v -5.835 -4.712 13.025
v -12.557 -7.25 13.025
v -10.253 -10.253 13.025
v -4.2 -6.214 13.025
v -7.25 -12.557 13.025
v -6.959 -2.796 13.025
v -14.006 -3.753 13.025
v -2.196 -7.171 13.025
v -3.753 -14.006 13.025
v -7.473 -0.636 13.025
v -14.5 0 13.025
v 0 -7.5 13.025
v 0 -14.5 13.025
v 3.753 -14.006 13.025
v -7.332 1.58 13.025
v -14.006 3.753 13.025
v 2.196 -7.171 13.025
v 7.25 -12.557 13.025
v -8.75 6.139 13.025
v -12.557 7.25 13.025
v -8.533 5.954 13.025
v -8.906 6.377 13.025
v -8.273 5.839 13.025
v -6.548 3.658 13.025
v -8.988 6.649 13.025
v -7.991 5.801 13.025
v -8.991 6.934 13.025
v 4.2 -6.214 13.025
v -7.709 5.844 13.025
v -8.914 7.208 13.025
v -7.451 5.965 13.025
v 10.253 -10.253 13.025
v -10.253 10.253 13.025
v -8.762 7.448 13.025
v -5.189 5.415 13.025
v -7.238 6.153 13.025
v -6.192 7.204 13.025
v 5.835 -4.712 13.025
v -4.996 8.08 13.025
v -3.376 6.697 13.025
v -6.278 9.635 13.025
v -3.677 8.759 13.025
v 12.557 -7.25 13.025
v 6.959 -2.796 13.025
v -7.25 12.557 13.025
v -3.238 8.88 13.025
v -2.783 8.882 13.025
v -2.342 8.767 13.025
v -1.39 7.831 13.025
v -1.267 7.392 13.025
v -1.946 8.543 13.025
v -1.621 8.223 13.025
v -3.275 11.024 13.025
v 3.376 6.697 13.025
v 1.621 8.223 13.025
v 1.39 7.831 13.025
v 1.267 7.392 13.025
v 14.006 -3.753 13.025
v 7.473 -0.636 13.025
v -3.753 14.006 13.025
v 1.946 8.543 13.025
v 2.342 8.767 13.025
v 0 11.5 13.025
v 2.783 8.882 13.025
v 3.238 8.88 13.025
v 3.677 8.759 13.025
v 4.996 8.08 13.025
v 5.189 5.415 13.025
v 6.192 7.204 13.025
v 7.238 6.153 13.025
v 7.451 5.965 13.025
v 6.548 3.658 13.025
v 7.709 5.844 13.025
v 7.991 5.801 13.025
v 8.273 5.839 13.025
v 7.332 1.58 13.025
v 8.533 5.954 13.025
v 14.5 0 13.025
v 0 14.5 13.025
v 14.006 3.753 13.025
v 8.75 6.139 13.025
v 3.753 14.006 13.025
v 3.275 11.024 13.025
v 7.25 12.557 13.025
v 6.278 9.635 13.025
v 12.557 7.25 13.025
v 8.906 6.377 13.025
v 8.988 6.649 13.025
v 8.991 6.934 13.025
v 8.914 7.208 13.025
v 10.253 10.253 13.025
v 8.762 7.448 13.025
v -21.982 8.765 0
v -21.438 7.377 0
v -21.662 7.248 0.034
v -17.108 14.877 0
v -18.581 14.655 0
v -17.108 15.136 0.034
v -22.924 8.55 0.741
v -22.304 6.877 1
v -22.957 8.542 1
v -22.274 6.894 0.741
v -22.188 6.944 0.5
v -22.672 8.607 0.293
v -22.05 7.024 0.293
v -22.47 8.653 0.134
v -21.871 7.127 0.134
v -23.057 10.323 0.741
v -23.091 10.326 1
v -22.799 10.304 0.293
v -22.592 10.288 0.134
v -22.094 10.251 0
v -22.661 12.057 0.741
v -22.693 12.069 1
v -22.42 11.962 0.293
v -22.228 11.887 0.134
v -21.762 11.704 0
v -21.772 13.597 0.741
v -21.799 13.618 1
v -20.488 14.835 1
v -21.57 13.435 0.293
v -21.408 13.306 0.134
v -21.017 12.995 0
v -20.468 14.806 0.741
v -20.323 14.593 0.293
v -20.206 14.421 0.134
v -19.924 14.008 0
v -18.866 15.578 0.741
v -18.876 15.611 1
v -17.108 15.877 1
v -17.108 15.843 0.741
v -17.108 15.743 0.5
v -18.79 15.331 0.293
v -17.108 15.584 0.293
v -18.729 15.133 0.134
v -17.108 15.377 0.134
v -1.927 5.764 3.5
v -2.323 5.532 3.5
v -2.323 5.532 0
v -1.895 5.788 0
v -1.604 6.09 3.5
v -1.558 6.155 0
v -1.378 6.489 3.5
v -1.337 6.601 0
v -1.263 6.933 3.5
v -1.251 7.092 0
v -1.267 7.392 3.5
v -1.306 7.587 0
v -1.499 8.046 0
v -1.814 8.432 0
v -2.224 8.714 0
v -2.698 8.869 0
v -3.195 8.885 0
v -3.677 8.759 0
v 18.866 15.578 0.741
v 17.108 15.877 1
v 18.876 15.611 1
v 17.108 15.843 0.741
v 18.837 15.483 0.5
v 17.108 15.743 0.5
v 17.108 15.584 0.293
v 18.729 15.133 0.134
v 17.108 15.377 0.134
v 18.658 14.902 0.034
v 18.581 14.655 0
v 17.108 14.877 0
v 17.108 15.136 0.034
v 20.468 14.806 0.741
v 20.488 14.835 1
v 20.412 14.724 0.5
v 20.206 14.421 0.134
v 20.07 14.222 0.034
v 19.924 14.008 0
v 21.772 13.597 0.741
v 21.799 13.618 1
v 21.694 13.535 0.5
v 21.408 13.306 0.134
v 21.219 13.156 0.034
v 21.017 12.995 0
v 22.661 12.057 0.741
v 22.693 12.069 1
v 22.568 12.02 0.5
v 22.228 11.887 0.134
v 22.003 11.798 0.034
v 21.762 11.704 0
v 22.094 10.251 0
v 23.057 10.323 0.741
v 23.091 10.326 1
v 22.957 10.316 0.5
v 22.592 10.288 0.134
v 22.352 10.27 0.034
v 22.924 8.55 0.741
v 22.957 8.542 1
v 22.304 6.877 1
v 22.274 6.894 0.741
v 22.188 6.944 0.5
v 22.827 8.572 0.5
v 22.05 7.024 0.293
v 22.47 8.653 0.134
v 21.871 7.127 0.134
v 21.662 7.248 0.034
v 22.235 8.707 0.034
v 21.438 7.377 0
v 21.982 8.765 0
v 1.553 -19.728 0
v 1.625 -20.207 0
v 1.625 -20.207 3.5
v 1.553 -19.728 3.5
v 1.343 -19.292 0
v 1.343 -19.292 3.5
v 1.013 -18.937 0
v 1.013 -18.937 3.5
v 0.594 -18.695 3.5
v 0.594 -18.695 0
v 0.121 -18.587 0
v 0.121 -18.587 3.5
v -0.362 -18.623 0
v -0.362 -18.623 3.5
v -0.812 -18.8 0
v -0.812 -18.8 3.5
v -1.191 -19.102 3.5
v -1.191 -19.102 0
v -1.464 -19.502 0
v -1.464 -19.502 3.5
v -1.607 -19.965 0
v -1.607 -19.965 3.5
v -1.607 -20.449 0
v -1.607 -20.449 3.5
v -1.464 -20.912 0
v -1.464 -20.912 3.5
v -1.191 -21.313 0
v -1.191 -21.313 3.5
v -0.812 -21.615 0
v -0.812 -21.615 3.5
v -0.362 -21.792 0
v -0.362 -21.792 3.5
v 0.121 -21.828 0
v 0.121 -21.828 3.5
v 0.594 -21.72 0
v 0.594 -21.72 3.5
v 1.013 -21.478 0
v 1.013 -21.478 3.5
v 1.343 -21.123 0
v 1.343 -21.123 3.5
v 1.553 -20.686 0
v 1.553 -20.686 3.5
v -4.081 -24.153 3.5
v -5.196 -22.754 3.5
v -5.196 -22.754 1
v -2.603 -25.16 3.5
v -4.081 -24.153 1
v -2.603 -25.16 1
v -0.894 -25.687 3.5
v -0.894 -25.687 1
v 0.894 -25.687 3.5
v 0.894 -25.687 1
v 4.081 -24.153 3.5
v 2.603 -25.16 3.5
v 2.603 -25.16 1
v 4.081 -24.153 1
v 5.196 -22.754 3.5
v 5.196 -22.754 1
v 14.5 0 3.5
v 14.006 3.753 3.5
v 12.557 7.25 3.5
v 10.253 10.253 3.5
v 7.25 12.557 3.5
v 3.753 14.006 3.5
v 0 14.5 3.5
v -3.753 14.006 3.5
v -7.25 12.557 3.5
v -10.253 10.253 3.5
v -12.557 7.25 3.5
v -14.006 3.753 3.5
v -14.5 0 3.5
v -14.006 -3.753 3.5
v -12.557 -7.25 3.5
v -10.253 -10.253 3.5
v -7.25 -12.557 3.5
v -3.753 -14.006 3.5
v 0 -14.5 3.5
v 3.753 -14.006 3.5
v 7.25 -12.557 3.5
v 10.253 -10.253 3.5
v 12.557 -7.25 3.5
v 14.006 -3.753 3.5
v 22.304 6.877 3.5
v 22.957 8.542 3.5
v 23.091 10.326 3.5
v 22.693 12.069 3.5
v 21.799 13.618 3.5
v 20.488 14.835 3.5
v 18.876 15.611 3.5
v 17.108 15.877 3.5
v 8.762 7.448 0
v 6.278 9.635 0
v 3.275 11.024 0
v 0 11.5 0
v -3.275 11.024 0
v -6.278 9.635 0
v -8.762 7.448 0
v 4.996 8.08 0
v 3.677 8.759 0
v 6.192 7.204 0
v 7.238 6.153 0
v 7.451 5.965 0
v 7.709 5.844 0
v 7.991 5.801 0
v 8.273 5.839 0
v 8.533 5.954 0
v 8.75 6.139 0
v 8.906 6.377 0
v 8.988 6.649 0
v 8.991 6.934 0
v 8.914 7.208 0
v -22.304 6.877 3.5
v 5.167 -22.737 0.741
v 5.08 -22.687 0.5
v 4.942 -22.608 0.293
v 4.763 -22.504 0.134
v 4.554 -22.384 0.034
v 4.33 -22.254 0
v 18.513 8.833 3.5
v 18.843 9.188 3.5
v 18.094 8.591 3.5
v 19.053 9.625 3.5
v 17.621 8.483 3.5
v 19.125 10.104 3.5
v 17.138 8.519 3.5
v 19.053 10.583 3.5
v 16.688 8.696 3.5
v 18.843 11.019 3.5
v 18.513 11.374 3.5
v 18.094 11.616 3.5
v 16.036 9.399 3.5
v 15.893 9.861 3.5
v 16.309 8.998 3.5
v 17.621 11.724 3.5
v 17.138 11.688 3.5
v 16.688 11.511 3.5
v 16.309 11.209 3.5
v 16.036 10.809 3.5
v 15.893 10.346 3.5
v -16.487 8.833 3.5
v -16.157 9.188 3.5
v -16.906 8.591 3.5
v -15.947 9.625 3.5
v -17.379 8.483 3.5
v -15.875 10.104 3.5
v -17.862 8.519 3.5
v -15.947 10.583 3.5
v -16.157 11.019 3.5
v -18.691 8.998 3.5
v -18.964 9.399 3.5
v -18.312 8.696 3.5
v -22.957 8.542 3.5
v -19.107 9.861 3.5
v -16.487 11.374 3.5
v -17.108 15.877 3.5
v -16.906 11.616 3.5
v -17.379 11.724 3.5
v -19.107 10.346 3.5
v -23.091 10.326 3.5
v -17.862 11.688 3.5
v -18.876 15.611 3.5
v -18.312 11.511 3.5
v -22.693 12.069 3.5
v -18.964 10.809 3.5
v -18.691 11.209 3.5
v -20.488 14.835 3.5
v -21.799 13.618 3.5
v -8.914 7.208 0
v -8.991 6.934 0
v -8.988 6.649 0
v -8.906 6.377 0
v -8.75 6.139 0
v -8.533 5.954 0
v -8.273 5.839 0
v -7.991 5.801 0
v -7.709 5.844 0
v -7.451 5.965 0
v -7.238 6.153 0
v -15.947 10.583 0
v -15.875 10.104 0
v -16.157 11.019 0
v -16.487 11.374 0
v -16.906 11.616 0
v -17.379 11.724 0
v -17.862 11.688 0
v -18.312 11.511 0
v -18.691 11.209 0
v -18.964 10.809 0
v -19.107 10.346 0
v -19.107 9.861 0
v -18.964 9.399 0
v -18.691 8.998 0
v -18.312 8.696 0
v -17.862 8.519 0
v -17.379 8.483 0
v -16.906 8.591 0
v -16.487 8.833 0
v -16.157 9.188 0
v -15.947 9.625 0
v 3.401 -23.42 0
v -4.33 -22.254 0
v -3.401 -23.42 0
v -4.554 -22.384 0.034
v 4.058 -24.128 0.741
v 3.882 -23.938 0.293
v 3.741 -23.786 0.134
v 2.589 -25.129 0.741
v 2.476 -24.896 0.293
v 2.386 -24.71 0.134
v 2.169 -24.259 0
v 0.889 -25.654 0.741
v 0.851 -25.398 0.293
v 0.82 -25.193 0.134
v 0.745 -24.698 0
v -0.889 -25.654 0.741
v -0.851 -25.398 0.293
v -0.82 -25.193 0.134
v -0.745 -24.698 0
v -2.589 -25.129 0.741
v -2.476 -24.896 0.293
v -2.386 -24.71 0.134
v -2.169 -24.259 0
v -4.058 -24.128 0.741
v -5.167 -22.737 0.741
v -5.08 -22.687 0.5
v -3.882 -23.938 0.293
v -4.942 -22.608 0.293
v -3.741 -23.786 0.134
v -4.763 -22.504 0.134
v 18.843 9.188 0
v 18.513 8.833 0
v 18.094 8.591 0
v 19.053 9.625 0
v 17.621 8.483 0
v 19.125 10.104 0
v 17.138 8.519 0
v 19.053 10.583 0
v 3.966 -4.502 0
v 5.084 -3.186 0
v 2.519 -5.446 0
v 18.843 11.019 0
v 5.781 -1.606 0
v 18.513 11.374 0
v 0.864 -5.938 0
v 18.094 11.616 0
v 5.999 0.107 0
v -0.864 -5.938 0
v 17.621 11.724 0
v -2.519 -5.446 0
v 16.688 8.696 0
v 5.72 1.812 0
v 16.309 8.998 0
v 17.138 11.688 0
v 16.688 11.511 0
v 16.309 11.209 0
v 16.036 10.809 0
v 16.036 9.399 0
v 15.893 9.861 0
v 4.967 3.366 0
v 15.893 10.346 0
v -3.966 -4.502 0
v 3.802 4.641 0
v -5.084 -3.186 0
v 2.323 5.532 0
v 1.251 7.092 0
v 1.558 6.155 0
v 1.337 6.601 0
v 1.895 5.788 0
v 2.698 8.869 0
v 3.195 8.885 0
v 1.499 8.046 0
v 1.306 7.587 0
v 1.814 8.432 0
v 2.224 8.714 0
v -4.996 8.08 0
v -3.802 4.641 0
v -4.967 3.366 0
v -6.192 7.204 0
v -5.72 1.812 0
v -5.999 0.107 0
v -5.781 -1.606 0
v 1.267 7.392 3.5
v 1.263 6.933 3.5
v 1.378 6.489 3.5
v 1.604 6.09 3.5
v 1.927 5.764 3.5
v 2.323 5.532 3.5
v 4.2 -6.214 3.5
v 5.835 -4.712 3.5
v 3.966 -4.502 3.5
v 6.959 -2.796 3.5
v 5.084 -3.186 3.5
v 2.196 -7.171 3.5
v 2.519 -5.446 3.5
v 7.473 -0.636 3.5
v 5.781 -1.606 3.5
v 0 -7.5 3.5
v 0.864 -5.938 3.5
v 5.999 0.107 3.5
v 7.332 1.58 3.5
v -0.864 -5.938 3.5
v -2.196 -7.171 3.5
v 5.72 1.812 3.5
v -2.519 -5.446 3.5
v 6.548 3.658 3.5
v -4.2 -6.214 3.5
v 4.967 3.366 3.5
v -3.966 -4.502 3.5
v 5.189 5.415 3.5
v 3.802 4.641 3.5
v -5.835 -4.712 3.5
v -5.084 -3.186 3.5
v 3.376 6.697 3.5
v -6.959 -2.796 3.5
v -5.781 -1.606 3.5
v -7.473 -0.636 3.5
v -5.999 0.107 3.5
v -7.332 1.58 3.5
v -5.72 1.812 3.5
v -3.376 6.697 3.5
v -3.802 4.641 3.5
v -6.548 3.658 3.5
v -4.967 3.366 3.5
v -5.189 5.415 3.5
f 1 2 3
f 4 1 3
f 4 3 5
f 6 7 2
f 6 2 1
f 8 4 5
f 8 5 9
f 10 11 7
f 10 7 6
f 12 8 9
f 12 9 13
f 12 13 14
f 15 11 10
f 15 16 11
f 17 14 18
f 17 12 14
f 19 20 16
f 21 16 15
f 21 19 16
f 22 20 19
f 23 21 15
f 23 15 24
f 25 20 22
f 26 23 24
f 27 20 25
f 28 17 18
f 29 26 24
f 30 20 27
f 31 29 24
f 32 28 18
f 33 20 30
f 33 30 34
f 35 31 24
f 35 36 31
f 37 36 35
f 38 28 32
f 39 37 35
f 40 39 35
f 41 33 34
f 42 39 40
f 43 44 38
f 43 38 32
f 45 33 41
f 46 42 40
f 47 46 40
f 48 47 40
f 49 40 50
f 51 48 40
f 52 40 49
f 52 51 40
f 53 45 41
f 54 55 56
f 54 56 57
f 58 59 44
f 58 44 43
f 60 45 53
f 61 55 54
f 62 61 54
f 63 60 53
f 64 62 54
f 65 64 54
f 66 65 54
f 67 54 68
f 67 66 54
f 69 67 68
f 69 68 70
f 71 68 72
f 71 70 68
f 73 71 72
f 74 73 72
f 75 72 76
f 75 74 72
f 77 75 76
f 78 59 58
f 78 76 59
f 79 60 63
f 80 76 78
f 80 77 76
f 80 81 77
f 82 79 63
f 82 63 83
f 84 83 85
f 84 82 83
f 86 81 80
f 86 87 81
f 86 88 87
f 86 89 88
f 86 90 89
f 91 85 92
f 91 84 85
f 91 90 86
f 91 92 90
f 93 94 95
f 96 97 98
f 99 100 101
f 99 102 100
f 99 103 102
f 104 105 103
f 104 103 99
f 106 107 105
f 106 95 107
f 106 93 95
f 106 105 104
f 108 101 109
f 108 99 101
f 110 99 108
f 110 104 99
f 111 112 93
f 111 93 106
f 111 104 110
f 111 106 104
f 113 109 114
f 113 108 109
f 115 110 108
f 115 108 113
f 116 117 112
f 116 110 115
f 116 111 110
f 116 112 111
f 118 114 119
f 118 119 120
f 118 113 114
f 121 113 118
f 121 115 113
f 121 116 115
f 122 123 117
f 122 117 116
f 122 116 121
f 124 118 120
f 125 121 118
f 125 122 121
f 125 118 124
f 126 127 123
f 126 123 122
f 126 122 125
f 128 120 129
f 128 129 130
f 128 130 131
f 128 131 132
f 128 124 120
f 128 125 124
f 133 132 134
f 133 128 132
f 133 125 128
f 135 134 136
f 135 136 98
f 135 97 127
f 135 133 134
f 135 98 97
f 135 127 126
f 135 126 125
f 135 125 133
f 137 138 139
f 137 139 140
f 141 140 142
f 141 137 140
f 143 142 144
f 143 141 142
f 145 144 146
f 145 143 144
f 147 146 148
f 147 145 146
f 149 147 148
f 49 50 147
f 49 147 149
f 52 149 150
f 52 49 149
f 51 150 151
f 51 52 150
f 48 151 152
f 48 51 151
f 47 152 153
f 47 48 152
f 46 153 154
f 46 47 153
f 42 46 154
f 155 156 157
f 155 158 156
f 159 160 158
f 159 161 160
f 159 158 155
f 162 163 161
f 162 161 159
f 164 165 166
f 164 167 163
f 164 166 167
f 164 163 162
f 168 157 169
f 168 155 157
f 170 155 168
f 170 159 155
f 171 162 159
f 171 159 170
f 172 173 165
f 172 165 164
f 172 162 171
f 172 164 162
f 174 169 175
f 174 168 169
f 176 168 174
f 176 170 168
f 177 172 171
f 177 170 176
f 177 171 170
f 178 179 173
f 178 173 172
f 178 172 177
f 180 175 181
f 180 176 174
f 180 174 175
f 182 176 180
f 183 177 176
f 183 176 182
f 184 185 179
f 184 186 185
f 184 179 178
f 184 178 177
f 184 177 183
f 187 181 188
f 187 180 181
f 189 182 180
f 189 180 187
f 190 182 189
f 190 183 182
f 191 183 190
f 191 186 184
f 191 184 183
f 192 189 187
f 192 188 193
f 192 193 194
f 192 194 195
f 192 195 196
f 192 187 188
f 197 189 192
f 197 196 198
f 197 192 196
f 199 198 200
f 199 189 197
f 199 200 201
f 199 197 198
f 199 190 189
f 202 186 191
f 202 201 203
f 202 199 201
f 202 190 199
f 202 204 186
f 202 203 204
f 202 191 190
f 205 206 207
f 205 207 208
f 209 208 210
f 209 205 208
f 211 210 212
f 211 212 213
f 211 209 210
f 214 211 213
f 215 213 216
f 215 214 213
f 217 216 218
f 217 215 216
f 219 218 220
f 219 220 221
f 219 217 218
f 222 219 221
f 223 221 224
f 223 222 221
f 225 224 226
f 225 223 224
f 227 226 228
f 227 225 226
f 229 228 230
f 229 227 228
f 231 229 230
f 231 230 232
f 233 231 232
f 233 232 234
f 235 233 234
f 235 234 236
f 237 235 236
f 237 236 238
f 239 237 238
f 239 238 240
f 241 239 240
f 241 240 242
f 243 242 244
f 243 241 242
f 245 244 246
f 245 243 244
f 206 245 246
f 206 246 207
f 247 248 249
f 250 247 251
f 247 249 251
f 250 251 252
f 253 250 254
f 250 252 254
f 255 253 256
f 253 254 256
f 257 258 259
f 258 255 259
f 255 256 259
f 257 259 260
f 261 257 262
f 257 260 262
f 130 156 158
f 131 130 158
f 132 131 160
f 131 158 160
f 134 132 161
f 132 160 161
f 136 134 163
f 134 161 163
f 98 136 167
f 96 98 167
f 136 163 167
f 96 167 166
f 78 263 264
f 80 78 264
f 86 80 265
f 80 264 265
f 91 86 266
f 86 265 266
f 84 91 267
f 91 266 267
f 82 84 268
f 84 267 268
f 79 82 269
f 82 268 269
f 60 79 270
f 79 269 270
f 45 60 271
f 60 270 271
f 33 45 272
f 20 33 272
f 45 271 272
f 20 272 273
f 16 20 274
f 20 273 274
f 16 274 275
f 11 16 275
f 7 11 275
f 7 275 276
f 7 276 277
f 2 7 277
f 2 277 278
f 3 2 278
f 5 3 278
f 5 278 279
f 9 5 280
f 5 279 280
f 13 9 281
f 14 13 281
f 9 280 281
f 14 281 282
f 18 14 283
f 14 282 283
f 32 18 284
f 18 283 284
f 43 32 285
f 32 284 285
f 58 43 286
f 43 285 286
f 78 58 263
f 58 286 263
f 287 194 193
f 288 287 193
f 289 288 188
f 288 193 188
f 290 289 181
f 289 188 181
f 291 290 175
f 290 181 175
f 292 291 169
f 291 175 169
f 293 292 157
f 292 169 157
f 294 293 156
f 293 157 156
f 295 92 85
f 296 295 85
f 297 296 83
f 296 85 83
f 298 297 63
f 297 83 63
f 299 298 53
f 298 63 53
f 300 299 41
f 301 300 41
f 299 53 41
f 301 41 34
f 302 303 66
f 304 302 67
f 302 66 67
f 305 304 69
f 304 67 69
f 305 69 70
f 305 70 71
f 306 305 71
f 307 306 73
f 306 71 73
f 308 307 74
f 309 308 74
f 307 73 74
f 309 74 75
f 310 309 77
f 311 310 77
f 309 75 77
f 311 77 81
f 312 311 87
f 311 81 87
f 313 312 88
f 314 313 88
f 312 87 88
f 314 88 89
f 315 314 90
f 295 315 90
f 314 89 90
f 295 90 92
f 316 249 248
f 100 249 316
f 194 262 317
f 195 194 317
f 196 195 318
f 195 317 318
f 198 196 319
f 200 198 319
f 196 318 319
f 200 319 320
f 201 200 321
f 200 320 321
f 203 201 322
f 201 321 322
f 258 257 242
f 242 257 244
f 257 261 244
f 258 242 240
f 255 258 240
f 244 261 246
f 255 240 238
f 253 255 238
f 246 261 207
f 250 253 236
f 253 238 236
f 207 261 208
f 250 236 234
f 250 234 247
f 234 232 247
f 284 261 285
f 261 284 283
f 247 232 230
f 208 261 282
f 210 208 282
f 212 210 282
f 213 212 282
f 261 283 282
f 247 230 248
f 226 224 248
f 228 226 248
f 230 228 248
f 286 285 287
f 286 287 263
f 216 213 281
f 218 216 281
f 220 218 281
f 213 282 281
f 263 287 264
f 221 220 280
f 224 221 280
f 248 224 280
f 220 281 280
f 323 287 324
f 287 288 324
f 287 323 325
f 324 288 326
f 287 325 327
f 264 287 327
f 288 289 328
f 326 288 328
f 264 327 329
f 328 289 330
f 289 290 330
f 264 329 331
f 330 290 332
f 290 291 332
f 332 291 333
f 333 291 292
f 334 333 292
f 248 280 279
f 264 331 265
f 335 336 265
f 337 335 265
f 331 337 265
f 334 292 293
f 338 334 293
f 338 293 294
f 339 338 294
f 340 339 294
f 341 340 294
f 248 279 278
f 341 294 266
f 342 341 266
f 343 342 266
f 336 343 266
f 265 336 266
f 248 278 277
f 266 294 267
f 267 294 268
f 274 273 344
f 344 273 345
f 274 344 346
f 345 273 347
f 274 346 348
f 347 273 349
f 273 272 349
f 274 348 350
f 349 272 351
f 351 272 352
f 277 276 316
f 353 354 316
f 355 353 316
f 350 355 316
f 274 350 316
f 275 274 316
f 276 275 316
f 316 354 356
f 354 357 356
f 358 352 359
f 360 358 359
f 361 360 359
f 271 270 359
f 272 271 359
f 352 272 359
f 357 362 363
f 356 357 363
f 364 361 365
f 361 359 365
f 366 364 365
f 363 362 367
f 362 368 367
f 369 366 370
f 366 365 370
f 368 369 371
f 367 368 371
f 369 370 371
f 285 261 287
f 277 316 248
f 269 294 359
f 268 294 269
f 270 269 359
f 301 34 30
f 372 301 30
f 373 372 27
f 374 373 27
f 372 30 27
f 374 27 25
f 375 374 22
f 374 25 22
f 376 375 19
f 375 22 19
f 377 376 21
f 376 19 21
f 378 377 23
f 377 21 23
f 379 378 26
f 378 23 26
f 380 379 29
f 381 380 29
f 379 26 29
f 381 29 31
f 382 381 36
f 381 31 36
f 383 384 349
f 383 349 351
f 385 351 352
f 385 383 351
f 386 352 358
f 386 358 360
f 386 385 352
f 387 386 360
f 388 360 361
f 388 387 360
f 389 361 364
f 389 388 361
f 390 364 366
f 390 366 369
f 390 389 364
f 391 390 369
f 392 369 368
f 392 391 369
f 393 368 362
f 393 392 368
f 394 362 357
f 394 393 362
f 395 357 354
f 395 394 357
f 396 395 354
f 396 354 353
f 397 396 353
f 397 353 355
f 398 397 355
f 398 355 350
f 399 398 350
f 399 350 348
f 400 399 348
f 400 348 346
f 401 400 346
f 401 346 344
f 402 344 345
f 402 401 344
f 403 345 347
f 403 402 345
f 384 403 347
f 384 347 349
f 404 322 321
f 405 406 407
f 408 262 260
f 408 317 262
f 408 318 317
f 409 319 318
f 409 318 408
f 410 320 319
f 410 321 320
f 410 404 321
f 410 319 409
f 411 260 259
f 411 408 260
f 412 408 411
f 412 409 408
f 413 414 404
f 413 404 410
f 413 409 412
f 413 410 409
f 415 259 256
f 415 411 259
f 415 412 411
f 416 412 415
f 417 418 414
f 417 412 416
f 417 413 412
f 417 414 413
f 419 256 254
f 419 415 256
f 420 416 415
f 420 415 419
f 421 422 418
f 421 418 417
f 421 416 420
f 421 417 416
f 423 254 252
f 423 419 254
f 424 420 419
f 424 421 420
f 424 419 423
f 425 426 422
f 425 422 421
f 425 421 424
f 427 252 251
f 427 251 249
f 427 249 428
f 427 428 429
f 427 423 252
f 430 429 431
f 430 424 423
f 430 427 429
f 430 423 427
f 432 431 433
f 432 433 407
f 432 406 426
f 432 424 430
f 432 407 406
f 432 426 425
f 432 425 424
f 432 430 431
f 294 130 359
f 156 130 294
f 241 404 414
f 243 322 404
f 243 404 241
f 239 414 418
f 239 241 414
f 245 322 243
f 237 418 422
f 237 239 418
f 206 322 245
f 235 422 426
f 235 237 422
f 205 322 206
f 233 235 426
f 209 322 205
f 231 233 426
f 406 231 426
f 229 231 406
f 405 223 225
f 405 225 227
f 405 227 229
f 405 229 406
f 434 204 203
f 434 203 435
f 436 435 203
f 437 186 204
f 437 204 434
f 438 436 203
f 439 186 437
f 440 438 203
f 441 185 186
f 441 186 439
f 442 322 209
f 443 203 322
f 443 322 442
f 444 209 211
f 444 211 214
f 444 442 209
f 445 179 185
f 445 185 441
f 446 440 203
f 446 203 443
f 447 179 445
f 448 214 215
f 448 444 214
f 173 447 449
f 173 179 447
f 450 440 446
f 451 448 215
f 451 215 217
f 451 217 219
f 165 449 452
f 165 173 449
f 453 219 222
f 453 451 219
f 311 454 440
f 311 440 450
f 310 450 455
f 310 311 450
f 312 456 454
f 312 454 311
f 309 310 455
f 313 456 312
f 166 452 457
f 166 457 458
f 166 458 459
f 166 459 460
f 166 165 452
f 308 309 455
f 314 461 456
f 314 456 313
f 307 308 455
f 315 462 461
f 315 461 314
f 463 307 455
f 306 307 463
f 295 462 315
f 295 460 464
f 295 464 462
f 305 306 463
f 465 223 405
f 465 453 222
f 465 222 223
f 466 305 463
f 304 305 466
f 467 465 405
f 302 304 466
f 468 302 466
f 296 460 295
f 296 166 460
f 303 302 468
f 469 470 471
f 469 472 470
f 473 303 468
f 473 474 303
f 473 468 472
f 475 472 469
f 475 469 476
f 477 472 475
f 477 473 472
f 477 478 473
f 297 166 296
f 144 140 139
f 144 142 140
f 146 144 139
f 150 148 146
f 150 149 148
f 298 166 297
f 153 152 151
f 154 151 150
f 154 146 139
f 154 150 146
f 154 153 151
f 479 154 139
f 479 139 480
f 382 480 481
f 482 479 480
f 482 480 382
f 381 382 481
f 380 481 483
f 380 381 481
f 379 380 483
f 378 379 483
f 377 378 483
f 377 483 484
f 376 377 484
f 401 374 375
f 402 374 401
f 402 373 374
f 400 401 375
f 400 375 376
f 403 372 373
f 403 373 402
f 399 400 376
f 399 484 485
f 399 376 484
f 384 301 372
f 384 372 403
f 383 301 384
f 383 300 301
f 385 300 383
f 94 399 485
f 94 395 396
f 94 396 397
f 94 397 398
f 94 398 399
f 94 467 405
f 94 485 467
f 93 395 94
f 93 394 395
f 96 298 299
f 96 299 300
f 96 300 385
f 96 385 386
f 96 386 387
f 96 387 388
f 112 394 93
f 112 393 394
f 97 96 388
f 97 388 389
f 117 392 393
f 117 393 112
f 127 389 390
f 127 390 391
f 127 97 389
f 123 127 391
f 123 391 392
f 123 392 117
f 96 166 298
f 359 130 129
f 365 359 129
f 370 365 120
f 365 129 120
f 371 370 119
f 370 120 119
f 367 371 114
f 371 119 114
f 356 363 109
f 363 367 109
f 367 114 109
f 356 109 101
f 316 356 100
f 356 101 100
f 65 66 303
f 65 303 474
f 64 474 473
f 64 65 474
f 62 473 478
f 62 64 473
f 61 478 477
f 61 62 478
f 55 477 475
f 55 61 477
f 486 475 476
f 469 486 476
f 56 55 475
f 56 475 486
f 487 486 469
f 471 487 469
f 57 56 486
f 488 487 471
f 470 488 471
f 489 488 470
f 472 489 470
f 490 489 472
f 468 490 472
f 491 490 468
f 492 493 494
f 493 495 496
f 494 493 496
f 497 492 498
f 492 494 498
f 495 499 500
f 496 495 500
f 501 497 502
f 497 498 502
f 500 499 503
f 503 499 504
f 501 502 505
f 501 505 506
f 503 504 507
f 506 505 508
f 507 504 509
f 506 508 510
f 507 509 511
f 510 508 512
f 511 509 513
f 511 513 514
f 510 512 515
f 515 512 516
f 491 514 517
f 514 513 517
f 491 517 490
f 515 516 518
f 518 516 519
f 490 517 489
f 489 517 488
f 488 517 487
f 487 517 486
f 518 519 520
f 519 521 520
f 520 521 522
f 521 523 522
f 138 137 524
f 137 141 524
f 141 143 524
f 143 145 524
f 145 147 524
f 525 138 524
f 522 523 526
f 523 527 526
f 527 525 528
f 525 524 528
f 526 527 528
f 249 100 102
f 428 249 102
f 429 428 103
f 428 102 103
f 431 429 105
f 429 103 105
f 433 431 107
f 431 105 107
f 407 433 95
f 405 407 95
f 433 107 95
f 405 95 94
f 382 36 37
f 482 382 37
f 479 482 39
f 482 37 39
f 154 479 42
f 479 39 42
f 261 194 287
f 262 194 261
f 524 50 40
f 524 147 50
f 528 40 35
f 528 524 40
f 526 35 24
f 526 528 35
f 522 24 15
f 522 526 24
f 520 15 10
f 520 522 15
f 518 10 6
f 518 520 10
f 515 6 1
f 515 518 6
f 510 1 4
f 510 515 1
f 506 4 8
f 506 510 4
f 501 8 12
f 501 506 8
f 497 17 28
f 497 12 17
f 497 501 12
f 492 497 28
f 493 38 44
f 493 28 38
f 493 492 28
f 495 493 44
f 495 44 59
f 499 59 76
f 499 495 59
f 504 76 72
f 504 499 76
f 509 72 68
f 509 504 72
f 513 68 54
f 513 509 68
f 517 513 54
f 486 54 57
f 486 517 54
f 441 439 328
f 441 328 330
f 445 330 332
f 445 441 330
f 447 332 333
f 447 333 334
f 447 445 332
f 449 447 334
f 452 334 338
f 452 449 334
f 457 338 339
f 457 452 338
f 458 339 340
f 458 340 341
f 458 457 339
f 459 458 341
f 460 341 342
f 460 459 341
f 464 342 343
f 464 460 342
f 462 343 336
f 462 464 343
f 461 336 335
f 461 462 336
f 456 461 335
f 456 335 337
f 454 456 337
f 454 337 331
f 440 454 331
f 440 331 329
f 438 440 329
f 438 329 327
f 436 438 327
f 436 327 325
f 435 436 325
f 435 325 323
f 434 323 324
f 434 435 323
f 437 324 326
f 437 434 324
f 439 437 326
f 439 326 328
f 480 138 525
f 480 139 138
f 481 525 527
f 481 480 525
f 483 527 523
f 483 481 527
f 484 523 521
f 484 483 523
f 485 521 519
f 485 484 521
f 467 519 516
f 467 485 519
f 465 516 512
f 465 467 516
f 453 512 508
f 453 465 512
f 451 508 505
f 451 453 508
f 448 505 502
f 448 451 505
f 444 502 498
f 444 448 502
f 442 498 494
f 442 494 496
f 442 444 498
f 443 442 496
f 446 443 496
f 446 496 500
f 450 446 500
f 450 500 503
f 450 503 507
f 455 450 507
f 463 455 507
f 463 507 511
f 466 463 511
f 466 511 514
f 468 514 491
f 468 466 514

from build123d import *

# Parameters (mm, degrees)
ESQUISSE3_R             = 1.6250000000000002
ESQUISSE3_R_2           = 1.6250000000000007
ESQUISSE3_R_3           = 1.625000000000001
ESQUISSE3_R_4           = 6
BOSS_EXTRU_1_DEPTH      = 3.5
ESQUISSE4_R             = 14.499999999999998
ESQUISSE4_R_2           = 7.5
BOSS_EXTRU_2_DEPTH      = 9.524999999999999
CONG_2_R                = 1
CONG_3_R                = 6
ENL_V_MAT_EXTRU_1_DEPTH = 37.971588497459535
ENL_V_MAT_EXTRU_2_DEPTH = 37.971588497459535


with BuildPart() as part:
    # Esquisse3 → Boss.-Extru.1 (new body)
    with BuildSketch(Plane.XY):
        Polygon((0, -31.754264805429408), (-27.499999999999993, 15.877132402714718), (27.500000000000007, 15.877132402714718), align=None)
        with Locations((-17.5, 10.103629710818455)):
            Circle(ESQUISSE3_R, mode=Mode.SUBTRACT)
        with Locations((17.500000000000007, 10.10362971081846)):
            Circle(ESQUISSE3_R_2, mode=Mode.SUBTRACT)
        with Locations((4.24e-15, -20.2072594216369)):
            Circle(ESQUISSE3_R_3, mode=Mode.SUBTRACT)
        Circle(ESQUISSE3_R_4, mode=Mode.SUBTRACT)
    extrude(amount=BOSS_EXTRU_1_DEPTH)

    # Esquisse4 → Boss.-Extru.2 (add)
    with BuildSketch(Plane.XY.offset(3.5)):
        Circle(ESQUISSE4_R)
        Circle(ESQUISSE4_R_2, mode=Mode.SUBTRACT)
    extrude(amount=BOSS_EXTRU_2_DEPTH)

    # Congé2
    cong_2_edges = [part.edges().sort_by_distance(p)[0] for p in [
        (-13.749999999999996, -7.938566201357347, 0),
        (7.11e-15, 15.877132402714718, 0),
        (13.750000000000004, -7.938566201357343, 0),
    ]]
    fillet(cong_2_edges, radius=CONG_2_R)

    # Congé3
    # the kernel refuses this fillet: 6 mm, written as the material it takes off along each edge
    with BuildSketch(Plane(origin=(8.9e-16, -19.754264805429408, 0), x_dir=(0.8660254037844386, -0.5000000000000001, 0), z_dir=(0.5000000000000001, 0.8660254037844386, 0))) as cong_3_piece_1:
        with BuildLine():
            CenterArc((5, -1), 1, 0, 90)
            Line((6, -1), (6, 0))
            Line((6, 0), (5, 0))
        make_face()
    revolve(axis=Axis((8.9e-16, -19.754264805429408, 0), (0, 0, -1)), revolution_arc=120.00000000000001, mode=Mode.SUBTRACT)
    with BuildSketch(Plane(origin=(17.10769515458674, 9.877132402714714, 0), x_dir=(0, 1, 0), z_dir=(-1, 0, 0))) as cong_3_piece_2:
        with BuildLine():
            CenterArc((5, -1), 1, 0, 90)
            Line((6, -1), (6, 0))
            Line((6, 0), (5, 0))
        make_face()
    revolve(axis=Axis((17.10769515458674, 9.877132402714714, 0), (0, 0, -1)), revolution_arc=120.00000000000001, mode=Mode.SUBTRACT)
    with BuildSketch(Plane(origin=(-17.107695154586732, 9.877132402714722, 0), x_dir=(-0.8660254037844387, -0.49999999999999994, 0), z_dir=(0.49999999999999994, -0.8660254037844387, 0))) as cong_3_piece_3:
        with BuildLine():
            CenterArc((5, -1), 1, 0, 90)
            Line((6, -1), (6, 0))
            Line((6, 0), (5, 0))
        make_face()
    revolve(axis=Axis((-17.107695154586732, 9.877132402714722, 0), (0, 0, -1)), revolution_arc=119.99999999999999, mode=Mode.SUBTRACT)
    with BuildSketch(Plane(origin=(-6.7e-16, -31.754264805429408, -2.2e-16), x_dir=(-0.4999999999999999, 0.8660254037844388, 0), z_dir=(0, 0, 1))) as cong_3_piece_4:
        with BuildLine():
            CenterArc((CONG_3_R * 1.73205080757, -CONG_3_R), CONG_3_R, 90.00000000000003, 119.99999999999994)
            Line((CONG_3_R * 0.866025403784, -CONG_3_R * 1.5), (0, 0))
            Line((0, 0), (CONG_3_R * 1.73205080757, 1.1e-16))
        make_face()
    extrude(amount=29.48076211353316, mode=Mode.SUBTRACT)
    with BuildSketch(Plane(origin=(-27.499999999999996, 15.877132402714722, -2.2e-16), x_dir=(0.5, -0.8660254037844386, 0), z_dir=(0, 0, 1))) as cong_3_piece_5:
        with BuildLine():
            CenterArc((CONG_3_R * 1.73205080757, CONG_3_R), CONG_3_R, 150.00000000000003, 119.99999999999997)
            Line((CONG_3_R * 0.866025403784, CONG_3_R * 1.5), (0, 0))
            Line((0, 0), (CONG_3_R * 1.73205080757, 0))
        make_face()
    extrude(amount=29.480762113533153, mode=Mode.SUBTRACT)
    with BuildSketch(Plane(origin=(27.500000000000007, 15.877132402714718, -2.2e-16), x_dir=(-0.5000000000000001, -0.8660254037844385, 0), z_dir=(0, 0, 1))) as cong_3_piece_6:
        with BuildLine():
            CenterArc((CONG_3_R * 1.73205080757, -CONG_3_R), CONG_3_R, 90.00000000000003, 119.99999999999994)
            Line((CONG_3_R * 0.866025403784, -CONG_3_R * 1.5), (0, 0))
            Line((0, 0), (CONG_3_R * 1.73205080757, 1.1e-16))
        make_face()
    extrude(amount=29.480762113533174, mode=Mode.SUBTRACT)

    # Esquisse5 → Enlèv. mat.-Extru.1 (cut, through all)
    with BuildSketch(Plane.XY.offset(13.024999999999999)):
        with BuildLine():
            ThreePointArc((-7.238095238095237, 6.153046182523176), (5.8e-16, 9.499999999999998), (7.238095238095237, 6.153046182523176))
            ThreePointArc((7.238095238095237, 6.153046182523176), (8.647689071844546, 6.038830492462959), (8.761904761904761, 7.448424326212267))
            ThreePointArc((8.761904761904761, 7.448424326212267), (7e-16, 11.5), (-8.761904761904761, 7.448424326212267))
            ThreePointArc((-8.761904761904761, 7.448424326212267), (-8.647689071844544, 6.038830492462961), (-7.238095238095237, 6.153046182523176))
        make_face()
    extrude(amount=-ENL_V_MAT_EXTRU_1_DEPTH, mode=Mode.SUBTRACT)

    # Esquisse6 → Enlèv. mat.-Extru.2 (cut, through all)
    with BuildSketch(Plane.XY.offset(13.024999999999999)):
        with BuildLine():
            ThreePointArc((-2.322580645161291, 5.532234552757338), (-1.3864315887791117, 7.823222318816936), (-3.677419354838709, 8.759371375199114))
            ThreePointArc((-3.677419354838709, 8.759371375199114), (5.8e-16, 9.499999999999998), (3.677419354838709, 8.759371375199114))
            ThreePointArc((3.677419354838709, 8.759371375199114), (1.3864315887791128, 7.823222318816936), (2.322580645161291, 5.532234552757338))
            ThreePointArc((2.322580645161291, 5.532234552757338), (3.7e-16, 6.000000000000003), (-2.322580645161291, 5.532234552757338))
        make_face()
    extrude(amount=-ENL_V_MAT_EXTRU_2_DEPTH, mode=Mode.SUBTRACT)


solid = part.part
